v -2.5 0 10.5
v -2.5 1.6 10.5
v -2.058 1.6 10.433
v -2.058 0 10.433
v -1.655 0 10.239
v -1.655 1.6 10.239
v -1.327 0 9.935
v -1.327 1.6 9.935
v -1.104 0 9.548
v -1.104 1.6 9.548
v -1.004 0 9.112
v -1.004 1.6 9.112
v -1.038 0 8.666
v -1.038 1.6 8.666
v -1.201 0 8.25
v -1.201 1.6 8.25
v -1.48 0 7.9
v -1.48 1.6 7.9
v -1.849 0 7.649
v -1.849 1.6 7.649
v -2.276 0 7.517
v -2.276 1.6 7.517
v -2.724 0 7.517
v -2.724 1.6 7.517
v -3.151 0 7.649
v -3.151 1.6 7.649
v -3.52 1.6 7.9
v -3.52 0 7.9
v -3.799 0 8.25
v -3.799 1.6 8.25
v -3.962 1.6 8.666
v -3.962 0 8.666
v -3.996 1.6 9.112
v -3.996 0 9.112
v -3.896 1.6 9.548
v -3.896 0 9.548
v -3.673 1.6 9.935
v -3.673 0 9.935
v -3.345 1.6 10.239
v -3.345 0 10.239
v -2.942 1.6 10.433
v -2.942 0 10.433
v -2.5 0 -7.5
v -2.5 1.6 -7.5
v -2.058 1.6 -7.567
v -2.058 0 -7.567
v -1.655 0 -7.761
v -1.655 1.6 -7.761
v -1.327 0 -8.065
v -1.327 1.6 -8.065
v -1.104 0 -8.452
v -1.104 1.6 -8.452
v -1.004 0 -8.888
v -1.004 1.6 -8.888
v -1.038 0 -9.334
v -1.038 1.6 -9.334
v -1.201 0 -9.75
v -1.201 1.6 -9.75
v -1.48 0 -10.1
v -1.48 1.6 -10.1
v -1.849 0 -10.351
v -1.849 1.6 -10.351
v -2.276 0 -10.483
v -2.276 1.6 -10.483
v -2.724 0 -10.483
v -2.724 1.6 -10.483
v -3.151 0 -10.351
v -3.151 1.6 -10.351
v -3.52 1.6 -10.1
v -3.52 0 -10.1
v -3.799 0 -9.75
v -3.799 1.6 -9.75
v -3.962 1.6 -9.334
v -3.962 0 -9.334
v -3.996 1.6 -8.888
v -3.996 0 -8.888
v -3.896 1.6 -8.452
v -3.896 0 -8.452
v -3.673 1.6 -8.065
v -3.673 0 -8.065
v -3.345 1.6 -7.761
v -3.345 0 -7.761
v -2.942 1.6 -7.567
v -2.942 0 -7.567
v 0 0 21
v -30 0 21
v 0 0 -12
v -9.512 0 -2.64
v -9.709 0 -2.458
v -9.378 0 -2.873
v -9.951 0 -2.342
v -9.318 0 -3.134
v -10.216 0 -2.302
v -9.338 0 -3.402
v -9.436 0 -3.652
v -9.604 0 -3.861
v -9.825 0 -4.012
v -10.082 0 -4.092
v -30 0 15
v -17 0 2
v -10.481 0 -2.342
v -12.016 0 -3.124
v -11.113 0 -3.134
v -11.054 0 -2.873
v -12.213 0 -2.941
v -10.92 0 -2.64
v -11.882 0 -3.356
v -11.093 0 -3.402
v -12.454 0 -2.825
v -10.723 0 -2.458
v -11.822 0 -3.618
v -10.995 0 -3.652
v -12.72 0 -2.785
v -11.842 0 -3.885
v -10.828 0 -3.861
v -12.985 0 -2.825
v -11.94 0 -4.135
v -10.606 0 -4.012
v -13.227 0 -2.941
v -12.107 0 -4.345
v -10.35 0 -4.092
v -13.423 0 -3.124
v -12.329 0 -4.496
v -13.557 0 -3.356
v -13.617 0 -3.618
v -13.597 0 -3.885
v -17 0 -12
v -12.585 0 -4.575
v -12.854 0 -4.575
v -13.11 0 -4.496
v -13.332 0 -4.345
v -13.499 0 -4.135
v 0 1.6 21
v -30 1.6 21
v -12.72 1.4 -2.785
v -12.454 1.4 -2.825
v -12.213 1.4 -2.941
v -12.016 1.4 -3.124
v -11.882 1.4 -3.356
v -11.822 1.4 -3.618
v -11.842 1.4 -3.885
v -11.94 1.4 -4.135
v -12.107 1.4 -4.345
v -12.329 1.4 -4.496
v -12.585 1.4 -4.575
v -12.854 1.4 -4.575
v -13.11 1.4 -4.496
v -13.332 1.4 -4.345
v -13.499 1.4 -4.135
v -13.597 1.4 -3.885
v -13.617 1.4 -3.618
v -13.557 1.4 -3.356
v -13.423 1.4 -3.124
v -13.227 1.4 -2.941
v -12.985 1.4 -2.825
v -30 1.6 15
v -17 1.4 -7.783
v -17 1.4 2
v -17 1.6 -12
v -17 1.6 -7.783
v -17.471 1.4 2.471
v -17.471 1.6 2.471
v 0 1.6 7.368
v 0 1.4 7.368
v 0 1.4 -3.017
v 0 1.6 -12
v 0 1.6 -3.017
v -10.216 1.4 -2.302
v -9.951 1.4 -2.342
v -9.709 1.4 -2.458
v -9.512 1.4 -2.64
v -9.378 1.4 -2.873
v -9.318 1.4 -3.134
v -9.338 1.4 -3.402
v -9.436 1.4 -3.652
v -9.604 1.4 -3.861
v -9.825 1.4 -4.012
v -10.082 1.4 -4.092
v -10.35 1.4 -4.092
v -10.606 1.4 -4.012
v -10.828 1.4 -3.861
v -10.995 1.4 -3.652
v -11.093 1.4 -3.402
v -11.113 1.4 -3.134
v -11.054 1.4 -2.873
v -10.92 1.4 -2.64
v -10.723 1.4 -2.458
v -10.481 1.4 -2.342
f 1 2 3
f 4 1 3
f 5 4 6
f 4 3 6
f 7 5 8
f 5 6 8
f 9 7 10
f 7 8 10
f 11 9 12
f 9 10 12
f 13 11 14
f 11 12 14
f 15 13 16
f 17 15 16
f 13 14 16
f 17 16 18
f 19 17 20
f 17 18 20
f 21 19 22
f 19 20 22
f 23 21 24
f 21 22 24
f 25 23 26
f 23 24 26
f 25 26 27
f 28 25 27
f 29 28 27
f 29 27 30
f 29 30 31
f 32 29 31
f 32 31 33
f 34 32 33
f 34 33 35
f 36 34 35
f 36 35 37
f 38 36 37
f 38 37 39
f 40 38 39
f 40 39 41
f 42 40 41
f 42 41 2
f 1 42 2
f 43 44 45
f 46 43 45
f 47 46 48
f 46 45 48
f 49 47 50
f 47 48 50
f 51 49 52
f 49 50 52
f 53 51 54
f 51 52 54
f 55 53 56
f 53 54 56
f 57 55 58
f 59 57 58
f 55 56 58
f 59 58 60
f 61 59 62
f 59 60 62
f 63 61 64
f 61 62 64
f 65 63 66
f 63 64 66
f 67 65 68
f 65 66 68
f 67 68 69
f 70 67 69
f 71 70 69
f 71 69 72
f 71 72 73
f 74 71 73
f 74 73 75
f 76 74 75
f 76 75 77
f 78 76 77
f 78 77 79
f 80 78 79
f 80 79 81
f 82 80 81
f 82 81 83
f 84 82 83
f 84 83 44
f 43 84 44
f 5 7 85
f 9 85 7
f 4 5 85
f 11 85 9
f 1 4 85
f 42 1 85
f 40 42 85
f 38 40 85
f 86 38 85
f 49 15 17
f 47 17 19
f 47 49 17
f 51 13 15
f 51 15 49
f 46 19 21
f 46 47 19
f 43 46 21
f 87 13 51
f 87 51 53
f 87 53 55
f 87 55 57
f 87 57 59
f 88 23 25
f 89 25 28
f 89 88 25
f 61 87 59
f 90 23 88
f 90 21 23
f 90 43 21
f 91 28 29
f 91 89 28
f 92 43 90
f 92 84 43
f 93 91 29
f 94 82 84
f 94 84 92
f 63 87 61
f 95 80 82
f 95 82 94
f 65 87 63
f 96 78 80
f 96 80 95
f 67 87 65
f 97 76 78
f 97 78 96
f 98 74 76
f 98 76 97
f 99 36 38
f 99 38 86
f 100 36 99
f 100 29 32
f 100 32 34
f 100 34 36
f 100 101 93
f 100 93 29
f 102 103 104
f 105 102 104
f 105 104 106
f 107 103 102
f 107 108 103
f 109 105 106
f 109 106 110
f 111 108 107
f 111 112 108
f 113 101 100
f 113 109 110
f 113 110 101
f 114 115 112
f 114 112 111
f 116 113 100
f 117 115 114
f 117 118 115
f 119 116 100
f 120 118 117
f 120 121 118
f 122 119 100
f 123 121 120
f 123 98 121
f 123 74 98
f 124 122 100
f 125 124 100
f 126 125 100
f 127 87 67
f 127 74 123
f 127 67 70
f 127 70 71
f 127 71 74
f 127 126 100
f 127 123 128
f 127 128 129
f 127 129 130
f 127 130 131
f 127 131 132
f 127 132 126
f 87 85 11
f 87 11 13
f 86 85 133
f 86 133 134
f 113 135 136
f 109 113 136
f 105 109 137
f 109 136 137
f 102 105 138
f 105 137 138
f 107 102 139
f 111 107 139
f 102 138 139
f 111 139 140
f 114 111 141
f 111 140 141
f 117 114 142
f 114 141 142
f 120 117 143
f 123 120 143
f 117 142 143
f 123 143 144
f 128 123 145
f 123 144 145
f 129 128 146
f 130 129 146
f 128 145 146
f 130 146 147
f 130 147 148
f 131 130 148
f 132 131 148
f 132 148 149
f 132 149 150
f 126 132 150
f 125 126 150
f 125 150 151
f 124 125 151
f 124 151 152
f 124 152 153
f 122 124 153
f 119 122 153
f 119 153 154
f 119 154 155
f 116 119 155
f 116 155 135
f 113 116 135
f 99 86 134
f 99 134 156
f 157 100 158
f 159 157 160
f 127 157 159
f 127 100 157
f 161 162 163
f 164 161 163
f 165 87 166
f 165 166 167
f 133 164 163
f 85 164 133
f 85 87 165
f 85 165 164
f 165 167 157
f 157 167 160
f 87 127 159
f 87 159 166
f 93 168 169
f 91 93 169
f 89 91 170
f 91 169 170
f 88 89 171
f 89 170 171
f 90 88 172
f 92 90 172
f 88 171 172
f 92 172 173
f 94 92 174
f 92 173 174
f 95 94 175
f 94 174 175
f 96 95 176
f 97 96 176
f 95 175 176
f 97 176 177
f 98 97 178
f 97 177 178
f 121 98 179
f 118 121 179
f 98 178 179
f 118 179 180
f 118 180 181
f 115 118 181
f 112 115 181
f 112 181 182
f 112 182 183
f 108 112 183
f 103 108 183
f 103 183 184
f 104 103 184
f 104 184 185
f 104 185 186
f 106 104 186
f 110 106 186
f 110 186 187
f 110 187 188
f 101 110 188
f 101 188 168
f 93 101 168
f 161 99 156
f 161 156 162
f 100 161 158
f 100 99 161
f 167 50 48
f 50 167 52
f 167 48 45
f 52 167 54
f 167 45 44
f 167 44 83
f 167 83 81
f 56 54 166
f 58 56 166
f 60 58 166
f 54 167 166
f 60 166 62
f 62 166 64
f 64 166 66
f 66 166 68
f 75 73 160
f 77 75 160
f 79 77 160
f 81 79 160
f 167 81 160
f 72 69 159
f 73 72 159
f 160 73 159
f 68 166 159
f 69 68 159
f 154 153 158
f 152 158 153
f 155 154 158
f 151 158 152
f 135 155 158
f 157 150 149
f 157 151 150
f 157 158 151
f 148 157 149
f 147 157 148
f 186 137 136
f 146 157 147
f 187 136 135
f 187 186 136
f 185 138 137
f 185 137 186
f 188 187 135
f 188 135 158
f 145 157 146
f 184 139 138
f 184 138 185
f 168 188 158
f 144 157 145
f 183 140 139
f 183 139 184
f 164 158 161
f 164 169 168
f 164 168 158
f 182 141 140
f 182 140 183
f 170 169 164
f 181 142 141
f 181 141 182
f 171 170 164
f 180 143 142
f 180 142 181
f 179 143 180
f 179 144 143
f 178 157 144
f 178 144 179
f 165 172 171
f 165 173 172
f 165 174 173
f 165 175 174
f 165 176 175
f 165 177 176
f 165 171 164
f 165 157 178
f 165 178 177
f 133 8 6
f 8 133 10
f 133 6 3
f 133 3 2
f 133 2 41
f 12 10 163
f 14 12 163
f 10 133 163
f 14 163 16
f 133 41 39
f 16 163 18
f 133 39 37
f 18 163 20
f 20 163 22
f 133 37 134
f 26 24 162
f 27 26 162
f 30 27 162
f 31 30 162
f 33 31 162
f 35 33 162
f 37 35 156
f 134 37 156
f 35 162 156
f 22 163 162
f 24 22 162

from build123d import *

# Parameters (mm, degrees)
EXTRUSION1_DEPTH        = 1.6
ESQUISSE2_R             = 0.9
ENL_V_MAT_EXTRU_1_DEPTH = 37.654604076
ENL_V_MAT_EXTRU_2_DEPTH = 0.2
ESQUISSE4_R             = 1.5
ENL_V_MAT_EXTRU_3_DEPTH = 37.654604076


with BuildPart() as part:
    # Esquisse1 → Extrusion1 (new body)
    with BuildSketch(Plane(origin=(0, 0, 0), x_dir=(1, 0, 0), z_dir=(0, 1, 0))):
        Polygon((-17, 12), (0, 12), (0, -21), (-30, -21), (-30, -15), (-17, -2), align=None)
    extrude(amount=EXTRUSION1_DEPTH)

    # Esquisse2 → Enlèv. mat.-Extru.1 (cut, through all)
    with BuildSketch(Plane(origin=(0, 1.6, 0), x_dir=(1, 0, 0), z_dir=(0, 1, 0))):
        with Locations(Location((-12.719630786, 3.685060513, 0), (0, 0, 270))):
            Circle(ESQUISSE2_R)
        with Locations(Location((-10.215884924, 3.201576633, 0), (0, 0, 270))):
            Circle(ESQUISSE2_R)
    extrude(amount=-ENL_V_MAT_EXTRU_1_DEPTH, mode=Mode.SUBTRACT)

    # Esquisse3 → Enlèv. mat.-Extru.2 (cut)
    with BuildSketch(Plane(origin=(0, 1.6, 0), x_dir=(1, 0, 0), z_dir=(0, 1, 0))):
        Polygon((-17, 7.782827883), (-17, -2), (-17.470712916, -2.470712916), (0, -7.368289602), (0, 3.017206465), align=None)
    extrude(amount=-ENL_V_MAT_EXTRU_2_DEPTH, mode=Mode.SUBTRACT)

    # Esquisse4 → Enlèv. mat.-Extru.3 (cut, through all)
    with BuildSketch(Plane(origin=(0, 1.6, 0), x_dir=(1, 0, 0), z_dir=(0, 1, 0))):
        with Locations(Location((-2.5, 9, 0), (0, 0, 270))):
            Circle(ESQUISSE4_R)
        with Locations(Location((-2.5, -9, 0), (0, 0, 270))):
            Circle(ESQUISSE4_R)
    extrude(amount=-ENL_V_MAT_EXTRU_3_DEPTH, mode=Mode.SUBTRACT)


solid = part.part
